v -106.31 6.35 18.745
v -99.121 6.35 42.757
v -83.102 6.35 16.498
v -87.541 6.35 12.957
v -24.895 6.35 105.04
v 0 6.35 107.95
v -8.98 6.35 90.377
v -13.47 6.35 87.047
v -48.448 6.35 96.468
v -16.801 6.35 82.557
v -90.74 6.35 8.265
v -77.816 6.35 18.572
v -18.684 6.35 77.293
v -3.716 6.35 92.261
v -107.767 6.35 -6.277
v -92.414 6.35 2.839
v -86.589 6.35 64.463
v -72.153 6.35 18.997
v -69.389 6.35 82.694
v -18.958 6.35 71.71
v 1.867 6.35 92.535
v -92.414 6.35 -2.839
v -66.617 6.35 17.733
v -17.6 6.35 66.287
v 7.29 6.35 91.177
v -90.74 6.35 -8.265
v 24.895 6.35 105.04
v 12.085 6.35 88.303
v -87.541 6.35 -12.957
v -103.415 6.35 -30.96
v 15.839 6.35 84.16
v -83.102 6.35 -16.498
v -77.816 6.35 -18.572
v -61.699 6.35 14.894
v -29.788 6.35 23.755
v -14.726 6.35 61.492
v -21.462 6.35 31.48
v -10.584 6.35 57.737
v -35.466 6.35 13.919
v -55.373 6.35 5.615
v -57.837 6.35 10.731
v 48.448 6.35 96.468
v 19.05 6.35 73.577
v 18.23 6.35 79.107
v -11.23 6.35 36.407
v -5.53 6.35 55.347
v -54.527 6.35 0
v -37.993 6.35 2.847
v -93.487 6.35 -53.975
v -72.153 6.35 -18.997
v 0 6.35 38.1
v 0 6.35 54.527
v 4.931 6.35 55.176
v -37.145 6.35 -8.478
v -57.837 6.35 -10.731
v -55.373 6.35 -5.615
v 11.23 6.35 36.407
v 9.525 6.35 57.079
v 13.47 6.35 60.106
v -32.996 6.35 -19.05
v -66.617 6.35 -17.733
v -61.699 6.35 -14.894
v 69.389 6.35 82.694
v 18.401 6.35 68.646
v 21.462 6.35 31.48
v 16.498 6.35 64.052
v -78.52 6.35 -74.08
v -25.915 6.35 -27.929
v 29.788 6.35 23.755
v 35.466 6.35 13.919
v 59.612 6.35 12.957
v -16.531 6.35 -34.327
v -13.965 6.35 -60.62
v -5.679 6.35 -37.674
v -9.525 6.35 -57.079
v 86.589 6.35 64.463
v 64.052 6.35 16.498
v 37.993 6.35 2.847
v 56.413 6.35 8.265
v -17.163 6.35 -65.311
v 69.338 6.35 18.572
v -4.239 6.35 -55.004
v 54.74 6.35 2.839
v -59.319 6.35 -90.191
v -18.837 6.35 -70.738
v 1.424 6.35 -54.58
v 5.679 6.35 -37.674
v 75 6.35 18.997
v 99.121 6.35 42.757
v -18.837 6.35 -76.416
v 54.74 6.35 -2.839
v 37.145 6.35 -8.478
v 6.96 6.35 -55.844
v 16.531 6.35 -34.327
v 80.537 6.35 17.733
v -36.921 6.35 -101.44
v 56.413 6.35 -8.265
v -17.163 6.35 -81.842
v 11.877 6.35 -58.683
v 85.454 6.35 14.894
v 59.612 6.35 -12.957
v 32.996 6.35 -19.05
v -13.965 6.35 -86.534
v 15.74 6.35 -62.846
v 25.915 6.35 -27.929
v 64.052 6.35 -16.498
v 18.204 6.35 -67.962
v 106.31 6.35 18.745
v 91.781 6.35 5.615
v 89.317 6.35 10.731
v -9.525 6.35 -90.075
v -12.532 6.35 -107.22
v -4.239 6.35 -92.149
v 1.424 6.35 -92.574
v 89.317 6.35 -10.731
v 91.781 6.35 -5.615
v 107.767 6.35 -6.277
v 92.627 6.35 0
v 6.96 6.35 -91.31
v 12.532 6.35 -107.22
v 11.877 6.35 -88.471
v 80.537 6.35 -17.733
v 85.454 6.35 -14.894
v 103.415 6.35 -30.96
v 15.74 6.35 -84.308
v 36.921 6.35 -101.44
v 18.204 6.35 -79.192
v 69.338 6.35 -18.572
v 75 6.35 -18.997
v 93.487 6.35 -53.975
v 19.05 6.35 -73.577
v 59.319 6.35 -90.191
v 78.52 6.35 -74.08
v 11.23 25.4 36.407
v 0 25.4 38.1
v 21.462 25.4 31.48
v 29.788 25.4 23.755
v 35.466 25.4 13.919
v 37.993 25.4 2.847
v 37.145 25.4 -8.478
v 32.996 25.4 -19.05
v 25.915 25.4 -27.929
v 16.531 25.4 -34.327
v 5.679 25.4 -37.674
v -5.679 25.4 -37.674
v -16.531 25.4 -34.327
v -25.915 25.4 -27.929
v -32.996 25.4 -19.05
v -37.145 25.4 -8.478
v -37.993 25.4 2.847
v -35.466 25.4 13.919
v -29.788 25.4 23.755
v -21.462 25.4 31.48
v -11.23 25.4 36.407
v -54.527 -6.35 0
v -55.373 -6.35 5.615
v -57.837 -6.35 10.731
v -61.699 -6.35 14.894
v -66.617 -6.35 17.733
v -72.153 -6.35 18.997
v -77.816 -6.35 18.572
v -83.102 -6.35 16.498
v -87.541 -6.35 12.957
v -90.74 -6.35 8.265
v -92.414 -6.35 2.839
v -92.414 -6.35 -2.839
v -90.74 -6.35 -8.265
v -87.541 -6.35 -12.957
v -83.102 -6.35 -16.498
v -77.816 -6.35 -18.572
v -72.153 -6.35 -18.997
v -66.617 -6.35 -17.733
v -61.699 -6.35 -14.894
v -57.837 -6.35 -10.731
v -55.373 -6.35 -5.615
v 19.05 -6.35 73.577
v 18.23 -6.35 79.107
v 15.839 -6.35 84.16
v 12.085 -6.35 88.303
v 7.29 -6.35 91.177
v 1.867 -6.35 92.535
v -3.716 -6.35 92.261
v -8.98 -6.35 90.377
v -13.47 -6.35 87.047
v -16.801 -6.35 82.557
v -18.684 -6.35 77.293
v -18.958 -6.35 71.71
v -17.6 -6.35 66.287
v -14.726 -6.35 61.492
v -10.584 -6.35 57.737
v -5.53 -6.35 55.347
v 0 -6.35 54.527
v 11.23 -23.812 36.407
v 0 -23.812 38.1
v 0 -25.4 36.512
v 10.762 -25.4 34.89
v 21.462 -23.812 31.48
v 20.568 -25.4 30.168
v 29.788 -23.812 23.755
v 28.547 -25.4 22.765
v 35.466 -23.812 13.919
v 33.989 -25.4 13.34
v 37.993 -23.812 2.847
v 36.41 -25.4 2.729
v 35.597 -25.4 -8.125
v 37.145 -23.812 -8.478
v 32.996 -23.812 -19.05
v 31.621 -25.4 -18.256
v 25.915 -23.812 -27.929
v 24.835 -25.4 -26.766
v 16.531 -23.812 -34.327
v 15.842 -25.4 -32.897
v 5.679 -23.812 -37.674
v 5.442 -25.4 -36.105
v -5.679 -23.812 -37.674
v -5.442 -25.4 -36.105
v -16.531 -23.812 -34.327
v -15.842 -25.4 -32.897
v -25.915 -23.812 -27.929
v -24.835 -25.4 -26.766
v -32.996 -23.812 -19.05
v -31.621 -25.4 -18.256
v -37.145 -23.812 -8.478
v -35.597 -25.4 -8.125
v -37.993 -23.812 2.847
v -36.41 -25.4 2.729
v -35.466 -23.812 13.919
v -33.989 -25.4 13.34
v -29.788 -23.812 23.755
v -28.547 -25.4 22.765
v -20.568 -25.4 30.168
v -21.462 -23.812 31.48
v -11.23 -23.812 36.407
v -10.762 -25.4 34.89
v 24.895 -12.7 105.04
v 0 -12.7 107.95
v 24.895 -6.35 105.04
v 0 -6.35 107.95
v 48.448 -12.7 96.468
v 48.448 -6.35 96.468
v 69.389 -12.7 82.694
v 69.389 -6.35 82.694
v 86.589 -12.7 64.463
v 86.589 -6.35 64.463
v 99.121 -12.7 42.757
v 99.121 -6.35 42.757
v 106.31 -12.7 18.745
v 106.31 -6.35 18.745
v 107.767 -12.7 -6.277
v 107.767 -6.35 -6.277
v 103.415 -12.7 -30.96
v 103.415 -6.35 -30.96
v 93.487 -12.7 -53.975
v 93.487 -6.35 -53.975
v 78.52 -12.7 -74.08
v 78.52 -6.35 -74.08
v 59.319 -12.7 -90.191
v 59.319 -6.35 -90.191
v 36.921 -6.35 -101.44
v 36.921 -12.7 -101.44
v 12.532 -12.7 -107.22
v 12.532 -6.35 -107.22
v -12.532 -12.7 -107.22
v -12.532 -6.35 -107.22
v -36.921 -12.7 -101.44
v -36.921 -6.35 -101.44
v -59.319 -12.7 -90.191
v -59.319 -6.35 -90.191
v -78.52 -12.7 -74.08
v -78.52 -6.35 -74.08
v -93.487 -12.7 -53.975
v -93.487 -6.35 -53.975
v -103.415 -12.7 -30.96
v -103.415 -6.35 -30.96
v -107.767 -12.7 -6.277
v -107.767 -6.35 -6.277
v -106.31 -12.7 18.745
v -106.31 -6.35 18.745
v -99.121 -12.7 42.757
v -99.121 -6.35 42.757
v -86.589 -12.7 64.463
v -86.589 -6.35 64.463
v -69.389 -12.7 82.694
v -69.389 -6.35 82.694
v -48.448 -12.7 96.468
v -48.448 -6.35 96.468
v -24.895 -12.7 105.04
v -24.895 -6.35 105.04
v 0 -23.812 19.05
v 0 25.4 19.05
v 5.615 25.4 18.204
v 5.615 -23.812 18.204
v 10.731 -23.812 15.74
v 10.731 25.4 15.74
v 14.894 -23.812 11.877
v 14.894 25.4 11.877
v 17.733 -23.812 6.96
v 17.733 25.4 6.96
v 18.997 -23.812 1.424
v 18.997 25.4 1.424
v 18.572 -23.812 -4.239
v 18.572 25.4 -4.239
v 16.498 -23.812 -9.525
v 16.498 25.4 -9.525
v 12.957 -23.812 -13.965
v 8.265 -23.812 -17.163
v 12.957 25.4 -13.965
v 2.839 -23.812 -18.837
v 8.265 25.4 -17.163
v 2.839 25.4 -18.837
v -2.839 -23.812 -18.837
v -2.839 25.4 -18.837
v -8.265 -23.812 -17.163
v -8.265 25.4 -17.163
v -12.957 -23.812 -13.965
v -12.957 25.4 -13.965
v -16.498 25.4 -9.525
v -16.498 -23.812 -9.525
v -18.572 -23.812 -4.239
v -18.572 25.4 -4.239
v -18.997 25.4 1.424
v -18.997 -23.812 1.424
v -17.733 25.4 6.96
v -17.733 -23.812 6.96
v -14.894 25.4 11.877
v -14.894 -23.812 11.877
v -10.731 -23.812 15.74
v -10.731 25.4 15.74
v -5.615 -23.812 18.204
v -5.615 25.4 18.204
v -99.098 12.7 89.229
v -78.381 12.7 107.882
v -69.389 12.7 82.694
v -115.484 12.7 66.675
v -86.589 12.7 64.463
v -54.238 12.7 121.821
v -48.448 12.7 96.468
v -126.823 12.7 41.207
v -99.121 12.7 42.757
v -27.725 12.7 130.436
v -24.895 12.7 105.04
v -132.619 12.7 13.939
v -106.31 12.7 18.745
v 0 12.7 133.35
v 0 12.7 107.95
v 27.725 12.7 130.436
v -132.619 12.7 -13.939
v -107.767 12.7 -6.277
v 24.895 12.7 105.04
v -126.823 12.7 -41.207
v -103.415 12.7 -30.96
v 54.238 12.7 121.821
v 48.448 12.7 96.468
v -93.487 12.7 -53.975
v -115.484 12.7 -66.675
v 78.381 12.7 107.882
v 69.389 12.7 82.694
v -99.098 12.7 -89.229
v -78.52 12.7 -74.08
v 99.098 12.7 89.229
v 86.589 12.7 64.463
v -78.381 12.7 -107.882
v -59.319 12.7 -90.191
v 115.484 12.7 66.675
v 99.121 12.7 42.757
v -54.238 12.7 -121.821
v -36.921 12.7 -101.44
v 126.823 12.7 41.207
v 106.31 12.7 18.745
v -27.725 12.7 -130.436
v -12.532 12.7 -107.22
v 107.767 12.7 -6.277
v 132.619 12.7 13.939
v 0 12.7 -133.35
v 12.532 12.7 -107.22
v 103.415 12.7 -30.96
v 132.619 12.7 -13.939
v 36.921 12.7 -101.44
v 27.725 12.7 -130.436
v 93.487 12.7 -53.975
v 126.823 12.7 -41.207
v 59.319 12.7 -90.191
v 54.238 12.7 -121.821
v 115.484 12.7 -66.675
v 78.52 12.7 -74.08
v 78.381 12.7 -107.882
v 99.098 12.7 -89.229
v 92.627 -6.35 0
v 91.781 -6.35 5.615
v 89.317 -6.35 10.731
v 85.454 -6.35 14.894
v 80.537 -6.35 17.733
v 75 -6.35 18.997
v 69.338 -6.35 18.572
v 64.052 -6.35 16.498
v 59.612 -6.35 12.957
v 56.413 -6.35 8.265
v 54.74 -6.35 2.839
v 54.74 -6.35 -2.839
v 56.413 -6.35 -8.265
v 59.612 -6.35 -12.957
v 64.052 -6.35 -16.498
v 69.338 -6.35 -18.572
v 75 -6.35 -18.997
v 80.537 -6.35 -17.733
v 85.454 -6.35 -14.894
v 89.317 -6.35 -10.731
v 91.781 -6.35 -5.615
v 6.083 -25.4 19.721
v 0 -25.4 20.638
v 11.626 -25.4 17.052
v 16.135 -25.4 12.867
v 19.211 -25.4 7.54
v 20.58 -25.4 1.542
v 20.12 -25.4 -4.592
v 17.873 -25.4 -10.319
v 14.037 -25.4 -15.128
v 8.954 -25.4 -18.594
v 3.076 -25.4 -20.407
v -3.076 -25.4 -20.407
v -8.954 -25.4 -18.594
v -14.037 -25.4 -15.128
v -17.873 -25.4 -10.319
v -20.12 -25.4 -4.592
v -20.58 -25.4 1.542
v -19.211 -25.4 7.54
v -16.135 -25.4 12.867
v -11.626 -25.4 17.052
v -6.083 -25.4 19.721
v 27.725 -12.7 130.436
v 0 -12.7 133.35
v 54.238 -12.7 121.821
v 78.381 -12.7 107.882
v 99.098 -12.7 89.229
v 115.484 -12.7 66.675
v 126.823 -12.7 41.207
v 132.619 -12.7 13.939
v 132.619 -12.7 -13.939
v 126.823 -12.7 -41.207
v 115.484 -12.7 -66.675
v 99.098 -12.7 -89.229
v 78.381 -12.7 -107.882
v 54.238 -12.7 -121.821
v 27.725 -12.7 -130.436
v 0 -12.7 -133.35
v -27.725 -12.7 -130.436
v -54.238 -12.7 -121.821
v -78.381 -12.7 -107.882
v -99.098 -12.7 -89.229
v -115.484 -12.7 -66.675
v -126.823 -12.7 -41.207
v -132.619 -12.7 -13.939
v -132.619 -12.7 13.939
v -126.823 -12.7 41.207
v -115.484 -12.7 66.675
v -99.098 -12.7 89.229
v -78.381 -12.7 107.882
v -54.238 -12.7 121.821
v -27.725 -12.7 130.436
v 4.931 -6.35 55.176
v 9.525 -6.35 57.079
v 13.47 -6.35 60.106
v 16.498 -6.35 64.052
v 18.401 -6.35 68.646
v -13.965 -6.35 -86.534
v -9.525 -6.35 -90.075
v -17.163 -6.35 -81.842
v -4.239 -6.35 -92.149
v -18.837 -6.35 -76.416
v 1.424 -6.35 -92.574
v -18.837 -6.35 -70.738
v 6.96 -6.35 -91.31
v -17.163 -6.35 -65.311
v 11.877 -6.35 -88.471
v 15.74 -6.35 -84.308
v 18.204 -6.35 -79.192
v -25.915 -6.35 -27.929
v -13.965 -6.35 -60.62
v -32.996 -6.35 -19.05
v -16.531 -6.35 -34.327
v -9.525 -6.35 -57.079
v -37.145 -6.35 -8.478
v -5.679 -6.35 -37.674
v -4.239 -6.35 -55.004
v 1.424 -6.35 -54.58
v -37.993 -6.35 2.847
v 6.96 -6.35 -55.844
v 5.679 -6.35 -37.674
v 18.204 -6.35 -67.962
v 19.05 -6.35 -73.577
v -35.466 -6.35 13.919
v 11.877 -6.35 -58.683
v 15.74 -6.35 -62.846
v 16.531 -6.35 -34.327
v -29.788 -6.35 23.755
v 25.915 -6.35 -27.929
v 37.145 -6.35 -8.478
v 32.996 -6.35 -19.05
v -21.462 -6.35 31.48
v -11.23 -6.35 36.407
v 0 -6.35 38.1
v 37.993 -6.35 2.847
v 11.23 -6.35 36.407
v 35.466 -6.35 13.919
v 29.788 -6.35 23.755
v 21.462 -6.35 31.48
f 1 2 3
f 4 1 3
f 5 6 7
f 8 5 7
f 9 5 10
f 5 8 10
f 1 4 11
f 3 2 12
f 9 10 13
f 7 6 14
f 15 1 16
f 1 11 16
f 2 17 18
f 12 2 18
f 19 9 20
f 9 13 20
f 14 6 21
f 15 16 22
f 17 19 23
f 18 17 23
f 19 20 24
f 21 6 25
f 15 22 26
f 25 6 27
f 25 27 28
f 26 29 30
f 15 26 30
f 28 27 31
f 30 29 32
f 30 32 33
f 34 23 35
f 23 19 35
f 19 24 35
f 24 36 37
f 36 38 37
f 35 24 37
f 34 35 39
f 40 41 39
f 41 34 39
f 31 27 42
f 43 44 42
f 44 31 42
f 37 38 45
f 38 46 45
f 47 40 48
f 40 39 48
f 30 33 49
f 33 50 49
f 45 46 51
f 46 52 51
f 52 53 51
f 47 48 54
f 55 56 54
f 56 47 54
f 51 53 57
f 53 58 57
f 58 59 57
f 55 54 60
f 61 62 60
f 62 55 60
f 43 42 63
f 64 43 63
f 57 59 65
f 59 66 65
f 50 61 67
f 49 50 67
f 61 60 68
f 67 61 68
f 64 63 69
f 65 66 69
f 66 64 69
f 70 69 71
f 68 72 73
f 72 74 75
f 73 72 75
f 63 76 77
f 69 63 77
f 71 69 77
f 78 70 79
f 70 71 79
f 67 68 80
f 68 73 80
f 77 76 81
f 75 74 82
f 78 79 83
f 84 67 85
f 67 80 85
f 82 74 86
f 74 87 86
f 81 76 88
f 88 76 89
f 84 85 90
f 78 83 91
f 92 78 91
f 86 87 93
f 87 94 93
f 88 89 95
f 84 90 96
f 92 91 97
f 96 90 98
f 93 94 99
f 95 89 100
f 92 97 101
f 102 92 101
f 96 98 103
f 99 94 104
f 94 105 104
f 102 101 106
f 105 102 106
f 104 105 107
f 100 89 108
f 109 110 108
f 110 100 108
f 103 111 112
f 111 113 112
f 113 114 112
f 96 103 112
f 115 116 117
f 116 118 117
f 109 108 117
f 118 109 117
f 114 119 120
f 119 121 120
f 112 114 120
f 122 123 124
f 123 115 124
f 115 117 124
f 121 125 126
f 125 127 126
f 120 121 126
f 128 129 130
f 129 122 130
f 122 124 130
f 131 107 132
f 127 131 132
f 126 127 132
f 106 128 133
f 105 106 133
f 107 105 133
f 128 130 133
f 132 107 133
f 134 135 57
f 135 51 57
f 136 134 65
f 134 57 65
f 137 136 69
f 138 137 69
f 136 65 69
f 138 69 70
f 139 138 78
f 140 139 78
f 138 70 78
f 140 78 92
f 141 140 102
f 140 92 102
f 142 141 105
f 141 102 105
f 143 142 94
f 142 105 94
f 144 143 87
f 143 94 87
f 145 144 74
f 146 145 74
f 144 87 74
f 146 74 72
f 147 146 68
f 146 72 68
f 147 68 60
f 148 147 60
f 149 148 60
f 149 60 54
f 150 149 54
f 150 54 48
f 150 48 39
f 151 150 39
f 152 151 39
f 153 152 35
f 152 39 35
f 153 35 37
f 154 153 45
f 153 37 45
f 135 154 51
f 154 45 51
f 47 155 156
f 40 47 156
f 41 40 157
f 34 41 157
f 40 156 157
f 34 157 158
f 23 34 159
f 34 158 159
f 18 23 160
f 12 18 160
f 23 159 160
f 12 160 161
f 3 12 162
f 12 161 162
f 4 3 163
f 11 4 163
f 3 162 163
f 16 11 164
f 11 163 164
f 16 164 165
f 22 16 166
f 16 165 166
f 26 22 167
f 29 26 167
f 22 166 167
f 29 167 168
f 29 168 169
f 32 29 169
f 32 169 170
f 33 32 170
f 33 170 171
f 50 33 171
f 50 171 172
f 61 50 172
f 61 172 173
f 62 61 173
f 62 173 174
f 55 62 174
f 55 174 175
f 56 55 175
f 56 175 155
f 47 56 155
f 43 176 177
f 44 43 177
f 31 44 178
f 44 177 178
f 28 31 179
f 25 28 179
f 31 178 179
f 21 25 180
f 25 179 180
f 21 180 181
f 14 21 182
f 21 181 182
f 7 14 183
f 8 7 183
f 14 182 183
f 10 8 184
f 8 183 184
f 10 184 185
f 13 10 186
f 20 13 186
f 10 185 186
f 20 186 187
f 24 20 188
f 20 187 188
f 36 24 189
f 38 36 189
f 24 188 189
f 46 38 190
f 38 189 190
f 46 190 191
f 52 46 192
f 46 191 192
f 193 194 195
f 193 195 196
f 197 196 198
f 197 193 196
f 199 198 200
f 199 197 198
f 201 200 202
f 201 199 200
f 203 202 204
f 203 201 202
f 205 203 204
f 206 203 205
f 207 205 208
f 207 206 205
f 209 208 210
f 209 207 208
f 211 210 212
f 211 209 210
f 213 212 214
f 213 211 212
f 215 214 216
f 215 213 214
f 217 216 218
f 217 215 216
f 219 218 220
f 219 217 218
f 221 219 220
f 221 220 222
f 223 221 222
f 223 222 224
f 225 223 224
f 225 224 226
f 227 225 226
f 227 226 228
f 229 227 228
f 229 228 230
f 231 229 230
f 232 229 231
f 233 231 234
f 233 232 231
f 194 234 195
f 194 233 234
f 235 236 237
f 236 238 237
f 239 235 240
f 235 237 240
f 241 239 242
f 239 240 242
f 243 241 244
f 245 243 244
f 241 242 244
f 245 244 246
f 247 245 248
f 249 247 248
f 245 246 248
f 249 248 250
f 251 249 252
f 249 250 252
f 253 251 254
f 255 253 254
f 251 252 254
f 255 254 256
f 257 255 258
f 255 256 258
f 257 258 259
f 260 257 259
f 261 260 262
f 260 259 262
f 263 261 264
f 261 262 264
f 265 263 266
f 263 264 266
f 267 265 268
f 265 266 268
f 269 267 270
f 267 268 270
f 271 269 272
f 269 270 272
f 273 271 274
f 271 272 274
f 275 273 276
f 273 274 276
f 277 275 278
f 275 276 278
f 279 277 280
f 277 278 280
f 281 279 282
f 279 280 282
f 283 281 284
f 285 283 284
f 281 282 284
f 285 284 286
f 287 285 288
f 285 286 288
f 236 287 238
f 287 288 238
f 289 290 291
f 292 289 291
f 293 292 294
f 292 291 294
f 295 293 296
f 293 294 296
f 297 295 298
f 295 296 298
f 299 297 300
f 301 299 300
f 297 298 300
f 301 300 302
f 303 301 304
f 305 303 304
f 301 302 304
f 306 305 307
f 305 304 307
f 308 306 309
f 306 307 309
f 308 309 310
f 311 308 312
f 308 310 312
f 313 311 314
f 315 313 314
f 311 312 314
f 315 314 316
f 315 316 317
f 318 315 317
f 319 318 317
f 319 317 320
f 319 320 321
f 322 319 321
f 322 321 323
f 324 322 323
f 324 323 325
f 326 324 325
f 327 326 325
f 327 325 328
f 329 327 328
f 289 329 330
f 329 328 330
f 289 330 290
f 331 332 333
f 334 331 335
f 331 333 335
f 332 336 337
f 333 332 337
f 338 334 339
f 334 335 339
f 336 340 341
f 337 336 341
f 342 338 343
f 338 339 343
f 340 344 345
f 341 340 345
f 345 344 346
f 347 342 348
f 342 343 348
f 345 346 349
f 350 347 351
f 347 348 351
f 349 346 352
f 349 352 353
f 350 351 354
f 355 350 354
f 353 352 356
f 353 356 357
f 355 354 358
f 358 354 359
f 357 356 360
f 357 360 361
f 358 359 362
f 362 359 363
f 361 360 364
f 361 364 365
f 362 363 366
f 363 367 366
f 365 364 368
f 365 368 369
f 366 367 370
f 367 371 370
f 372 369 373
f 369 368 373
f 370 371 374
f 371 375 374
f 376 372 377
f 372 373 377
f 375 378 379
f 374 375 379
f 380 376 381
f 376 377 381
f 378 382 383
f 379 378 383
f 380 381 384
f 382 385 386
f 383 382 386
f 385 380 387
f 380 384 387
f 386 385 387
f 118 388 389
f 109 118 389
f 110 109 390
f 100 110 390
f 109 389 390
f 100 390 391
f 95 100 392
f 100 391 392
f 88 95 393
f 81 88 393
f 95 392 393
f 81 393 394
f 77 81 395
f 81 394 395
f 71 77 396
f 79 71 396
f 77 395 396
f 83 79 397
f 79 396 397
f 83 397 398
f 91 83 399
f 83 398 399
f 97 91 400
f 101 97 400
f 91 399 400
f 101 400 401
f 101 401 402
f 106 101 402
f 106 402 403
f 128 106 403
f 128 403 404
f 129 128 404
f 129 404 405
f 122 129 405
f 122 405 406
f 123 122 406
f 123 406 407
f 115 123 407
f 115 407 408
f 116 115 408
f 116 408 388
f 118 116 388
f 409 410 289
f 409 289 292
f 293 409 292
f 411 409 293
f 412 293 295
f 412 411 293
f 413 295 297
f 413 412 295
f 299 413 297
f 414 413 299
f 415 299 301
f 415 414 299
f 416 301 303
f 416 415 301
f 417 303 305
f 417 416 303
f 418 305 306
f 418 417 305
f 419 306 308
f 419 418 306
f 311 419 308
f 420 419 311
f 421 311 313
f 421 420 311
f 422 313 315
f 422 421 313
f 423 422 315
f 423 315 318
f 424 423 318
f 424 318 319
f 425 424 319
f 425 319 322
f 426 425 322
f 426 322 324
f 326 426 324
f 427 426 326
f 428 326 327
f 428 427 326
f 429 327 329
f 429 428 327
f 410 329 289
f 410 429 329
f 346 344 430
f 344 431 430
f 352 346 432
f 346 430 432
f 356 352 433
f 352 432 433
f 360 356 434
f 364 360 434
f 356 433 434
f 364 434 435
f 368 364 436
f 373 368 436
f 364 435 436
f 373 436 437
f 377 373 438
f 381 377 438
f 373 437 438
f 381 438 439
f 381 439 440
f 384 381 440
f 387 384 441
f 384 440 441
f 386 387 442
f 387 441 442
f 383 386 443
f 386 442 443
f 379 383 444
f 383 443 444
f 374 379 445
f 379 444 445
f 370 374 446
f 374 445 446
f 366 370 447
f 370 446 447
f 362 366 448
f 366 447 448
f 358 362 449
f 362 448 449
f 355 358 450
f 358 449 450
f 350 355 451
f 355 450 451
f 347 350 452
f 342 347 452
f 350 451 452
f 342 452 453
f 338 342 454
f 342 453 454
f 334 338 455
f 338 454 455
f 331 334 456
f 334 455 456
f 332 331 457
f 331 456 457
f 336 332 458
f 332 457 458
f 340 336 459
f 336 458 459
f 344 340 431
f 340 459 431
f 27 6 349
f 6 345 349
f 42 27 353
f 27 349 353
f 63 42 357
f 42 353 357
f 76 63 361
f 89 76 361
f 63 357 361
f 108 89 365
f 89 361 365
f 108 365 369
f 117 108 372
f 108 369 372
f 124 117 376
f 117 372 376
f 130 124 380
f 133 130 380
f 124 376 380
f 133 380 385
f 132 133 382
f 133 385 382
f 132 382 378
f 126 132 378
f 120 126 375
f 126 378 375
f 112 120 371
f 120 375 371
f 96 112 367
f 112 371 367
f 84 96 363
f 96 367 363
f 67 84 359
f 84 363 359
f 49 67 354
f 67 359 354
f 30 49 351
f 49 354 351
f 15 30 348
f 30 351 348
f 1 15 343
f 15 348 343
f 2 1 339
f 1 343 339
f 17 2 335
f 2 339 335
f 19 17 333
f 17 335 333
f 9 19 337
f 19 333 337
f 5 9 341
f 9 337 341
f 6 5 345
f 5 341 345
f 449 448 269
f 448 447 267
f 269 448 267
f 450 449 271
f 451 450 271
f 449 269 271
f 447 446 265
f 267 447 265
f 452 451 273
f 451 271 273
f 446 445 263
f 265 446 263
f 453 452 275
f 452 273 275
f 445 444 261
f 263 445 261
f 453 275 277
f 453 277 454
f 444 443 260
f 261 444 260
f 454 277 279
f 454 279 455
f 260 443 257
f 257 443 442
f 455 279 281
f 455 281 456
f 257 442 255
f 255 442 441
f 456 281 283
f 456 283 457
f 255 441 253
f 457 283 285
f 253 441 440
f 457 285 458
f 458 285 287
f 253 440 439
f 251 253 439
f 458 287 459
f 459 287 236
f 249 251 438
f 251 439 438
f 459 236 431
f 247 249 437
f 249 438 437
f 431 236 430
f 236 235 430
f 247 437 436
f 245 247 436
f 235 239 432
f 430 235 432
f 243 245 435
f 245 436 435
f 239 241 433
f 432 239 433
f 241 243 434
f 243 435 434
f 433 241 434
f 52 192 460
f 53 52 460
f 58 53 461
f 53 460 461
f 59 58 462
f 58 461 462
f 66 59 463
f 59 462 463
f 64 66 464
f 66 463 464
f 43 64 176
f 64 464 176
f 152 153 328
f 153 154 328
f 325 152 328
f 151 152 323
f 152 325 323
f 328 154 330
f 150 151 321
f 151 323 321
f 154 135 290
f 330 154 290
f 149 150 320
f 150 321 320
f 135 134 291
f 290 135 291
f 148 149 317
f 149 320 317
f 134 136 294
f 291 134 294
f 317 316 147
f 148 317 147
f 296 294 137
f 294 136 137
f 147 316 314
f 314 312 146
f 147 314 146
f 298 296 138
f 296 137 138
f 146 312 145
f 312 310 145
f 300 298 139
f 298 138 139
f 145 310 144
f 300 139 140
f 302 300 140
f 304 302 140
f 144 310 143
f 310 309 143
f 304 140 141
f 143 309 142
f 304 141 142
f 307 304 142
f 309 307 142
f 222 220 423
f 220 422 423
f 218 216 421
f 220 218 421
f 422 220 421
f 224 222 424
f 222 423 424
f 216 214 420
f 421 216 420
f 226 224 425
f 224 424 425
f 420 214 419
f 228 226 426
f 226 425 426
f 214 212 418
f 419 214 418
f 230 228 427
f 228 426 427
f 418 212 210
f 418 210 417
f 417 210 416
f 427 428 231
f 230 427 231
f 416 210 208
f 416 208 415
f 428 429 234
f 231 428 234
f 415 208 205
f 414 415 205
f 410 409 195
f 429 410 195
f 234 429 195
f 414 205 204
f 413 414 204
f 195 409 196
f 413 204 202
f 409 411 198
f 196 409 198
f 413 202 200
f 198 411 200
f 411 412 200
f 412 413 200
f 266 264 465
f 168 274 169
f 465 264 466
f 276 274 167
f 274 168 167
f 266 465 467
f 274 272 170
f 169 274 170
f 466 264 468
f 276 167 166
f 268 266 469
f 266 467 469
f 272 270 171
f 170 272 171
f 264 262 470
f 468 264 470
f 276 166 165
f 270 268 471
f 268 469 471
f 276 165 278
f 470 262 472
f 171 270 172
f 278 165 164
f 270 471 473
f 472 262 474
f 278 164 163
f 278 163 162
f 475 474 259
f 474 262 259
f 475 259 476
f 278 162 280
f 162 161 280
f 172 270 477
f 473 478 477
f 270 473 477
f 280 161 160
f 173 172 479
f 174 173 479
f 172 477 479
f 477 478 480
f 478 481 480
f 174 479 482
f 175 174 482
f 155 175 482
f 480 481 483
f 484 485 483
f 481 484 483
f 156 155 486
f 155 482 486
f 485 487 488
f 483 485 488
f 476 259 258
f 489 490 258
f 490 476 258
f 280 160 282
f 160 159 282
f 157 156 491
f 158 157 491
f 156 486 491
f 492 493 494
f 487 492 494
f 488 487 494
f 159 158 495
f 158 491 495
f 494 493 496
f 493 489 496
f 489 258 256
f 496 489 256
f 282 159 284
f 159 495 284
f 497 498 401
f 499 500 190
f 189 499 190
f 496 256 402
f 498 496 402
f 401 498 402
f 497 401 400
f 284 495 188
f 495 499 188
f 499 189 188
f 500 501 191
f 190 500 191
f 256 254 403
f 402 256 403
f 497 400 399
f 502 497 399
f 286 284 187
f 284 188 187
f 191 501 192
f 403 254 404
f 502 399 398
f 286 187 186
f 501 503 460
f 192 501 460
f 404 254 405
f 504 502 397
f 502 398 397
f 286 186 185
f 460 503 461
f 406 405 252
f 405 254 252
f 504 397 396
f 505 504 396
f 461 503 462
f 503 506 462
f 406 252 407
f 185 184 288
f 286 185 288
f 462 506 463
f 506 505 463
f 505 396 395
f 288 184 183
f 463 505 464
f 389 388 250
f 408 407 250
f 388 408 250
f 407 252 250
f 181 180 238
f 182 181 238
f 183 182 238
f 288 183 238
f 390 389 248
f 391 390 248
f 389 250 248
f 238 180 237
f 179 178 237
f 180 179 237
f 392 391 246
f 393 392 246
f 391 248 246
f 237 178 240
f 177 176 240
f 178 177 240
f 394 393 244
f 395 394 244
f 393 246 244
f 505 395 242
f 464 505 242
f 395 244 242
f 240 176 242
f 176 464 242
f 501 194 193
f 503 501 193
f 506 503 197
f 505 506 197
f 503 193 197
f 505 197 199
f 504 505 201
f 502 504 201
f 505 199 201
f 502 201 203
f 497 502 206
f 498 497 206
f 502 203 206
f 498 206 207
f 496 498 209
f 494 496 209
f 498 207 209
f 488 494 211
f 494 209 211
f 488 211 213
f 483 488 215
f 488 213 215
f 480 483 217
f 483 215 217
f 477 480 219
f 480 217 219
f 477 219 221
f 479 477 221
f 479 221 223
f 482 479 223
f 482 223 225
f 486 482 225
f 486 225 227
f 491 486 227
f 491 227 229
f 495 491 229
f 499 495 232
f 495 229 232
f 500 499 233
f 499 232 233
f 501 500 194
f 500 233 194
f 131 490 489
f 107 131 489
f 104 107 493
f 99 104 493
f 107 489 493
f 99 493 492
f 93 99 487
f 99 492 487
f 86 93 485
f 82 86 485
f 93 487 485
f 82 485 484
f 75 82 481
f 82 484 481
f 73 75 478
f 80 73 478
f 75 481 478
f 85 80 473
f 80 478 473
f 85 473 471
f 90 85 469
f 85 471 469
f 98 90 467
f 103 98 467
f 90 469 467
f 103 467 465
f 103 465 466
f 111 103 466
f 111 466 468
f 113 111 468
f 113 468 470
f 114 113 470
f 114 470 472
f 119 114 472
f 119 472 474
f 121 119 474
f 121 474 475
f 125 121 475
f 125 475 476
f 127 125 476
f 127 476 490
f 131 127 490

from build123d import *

# Parameters (mm, degrees)
F2_R     = 19.05
F3_DEPTH = 25.4
F4_SIZE  = 1.5875


with BuildPart() as f1:
    # F0 (on Right) → F1 (revolve)
    with BuildSketch(Plane.YZ):
        Polygon((-25.4, 19.05), (0, 19.05), (25.4, 19.05), (25.4, 38.1), (6.35, 38.1), (6.35, 107.95), (12.7, 107.95), (12.7, 133.35), (0, 133.35), (-12.7, 133.35), (-12.7, 107.95), (-6.35, 107.95), (-6.35, 38.1), (-25.4, 38.1), align=None)
    revolve(axis=Axis((0, 38.140107, 0), (0, 1, 0)))

    # F2 (on face) → F3 (cut)
    with BuildSketch(Plane.XZ.offset(6.35)):
        with Locations((73.57686, 0)):
            Circle(F2_R)
        with Locations((0, -73.57686)):
            Circle(F2_R)
        with Locations((-73.57686, 0)):
            Circle(F2_R)
        with BuildLine():
            ThreePointArc((19.05, 73.57686), (-13.470384, 87.047244), (0, 54.52686))
            ThreePointArc((0, 54.52686), (13.470384, 60.106476), (19.05, 73.57686))
        make_face()
    extrude(amount=-F3_DEPTH, mode=Mode.SUBTRACT)

    # F4
    f4_edges = [f1.edges().sort_by_distance(p)[0] for p in [
        (0, -25.4, -19.05),
        (0, -25.4, -38.1),
    ]]
    chamfer(f4_edges, length=F4_SIZE)


solid = f1.part
